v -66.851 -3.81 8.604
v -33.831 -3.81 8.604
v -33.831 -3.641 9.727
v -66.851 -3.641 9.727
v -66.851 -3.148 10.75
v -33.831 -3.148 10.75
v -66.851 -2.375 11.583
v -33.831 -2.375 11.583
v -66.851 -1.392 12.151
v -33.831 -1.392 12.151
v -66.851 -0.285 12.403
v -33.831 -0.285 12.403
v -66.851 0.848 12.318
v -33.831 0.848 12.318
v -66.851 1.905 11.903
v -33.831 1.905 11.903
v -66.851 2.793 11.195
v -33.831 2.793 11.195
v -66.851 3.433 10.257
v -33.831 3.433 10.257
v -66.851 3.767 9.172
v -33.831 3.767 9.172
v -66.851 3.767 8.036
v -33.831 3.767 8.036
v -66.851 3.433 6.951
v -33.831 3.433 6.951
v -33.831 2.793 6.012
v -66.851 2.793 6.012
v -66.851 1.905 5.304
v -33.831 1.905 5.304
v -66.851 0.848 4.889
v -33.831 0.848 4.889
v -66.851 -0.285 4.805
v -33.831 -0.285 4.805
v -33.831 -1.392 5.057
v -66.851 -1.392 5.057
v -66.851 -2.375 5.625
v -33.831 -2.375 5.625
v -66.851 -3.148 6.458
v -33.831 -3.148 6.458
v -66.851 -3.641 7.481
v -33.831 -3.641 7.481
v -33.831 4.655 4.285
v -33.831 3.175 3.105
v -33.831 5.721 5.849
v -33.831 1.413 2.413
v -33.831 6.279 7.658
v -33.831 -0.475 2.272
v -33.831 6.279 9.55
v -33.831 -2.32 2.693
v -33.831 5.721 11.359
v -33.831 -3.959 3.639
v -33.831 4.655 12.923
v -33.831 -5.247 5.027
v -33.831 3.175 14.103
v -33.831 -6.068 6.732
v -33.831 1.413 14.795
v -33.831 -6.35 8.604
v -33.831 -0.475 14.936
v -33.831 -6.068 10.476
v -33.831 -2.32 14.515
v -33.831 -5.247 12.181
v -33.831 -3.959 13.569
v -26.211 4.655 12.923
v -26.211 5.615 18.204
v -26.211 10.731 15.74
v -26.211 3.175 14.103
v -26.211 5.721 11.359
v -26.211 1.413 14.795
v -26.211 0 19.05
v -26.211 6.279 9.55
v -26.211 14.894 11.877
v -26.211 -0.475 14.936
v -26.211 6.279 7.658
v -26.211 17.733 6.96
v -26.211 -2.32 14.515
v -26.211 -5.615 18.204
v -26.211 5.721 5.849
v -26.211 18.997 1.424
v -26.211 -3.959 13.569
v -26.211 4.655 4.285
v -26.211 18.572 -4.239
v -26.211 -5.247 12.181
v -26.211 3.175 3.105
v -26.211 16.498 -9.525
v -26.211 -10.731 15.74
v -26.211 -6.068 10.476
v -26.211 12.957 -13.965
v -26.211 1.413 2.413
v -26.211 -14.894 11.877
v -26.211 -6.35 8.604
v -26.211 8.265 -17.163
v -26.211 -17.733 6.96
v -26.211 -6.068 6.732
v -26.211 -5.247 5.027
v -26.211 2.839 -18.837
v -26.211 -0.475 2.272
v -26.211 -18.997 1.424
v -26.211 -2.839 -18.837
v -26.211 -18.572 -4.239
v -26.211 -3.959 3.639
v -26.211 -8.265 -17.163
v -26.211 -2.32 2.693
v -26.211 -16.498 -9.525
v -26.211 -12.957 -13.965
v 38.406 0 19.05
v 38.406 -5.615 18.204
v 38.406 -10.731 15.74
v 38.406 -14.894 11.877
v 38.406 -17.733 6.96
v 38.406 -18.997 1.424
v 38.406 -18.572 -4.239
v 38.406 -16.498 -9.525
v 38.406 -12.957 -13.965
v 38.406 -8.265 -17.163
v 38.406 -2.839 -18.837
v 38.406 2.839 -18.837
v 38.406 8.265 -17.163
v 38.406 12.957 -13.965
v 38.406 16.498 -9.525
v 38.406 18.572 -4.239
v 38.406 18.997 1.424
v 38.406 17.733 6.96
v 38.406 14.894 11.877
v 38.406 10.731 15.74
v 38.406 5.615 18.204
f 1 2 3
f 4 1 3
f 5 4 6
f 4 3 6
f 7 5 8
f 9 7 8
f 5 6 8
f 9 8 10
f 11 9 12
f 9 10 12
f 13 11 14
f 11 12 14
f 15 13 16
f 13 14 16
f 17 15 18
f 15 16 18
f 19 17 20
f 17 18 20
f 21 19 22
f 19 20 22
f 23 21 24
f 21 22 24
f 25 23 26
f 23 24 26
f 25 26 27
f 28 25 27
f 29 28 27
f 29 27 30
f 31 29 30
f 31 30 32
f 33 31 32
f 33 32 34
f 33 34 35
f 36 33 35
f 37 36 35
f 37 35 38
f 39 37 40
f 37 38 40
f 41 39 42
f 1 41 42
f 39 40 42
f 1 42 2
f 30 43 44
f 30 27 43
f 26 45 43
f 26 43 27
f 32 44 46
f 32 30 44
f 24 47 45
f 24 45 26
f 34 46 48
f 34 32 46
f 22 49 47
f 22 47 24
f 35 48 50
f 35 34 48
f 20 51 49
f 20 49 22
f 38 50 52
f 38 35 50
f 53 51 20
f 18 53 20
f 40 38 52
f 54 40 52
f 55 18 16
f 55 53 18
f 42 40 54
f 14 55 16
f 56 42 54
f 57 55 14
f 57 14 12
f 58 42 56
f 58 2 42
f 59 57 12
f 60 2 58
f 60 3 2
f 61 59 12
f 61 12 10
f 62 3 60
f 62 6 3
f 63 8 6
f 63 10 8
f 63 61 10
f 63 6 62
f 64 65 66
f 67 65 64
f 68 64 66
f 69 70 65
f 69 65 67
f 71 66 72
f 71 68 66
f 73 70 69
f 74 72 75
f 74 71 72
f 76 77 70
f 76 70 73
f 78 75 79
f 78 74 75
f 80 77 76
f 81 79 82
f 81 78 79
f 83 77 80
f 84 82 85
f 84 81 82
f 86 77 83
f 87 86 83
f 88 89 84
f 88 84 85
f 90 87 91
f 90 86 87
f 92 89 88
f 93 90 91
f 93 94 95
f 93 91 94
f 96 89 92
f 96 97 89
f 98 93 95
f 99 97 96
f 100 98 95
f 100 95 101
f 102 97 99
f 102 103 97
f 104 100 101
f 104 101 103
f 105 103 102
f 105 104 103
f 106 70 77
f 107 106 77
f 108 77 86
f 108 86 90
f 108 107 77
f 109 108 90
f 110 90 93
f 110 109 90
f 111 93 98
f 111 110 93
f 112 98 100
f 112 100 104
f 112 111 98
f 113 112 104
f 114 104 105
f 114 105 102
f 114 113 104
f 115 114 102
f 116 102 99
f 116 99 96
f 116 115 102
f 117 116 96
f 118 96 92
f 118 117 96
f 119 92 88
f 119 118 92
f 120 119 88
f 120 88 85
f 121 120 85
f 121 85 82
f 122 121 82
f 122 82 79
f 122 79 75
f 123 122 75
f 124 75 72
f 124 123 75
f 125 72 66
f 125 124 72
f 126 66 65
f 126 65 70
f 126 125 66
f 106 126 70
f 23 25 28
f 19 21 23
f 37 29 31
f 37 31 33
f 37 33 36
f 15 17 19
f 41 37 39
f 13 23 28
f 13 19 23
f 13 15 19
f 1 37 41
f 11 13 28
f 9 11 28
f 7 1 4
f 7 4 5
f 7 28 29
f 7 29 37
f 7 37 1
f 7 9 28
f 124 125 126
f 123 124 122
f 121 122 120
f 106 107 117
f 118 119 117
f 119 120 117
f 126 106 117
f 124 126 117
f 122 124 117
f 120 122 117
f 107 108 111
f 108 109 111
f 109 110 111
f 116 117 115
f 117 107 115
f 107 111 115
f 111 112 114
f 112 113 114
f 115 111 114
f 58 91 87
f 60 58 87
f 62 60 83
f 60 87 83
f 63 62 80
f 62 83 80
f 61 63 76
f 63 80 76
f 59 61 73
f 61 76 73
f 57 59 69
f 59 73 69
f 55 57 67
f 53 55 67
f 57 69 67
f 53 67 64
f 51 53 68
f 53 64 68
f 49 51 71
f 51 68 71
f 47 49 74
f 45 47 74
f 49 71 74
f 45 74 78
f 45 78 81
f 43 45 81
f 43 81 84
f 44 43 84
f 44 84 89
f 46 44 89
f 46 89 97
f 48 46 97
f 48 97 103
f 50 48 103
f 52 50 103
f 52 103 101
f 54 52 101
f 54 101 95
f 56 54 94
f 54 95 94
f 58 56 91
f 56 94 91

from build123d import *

# Parameters (mm, degrees)
F0_W     = 64.6176
F0_H     = 19.05
F2_R     = 6.35
F3_DEPTH = 7.62
F4_R     = 3.81
F5_DEPTH = 33.02


with BuildPart() as f1:
    # F0 (on Front) → F1 (revolve)
    with BuildSketch(Plane.XZ):
        with Locations((6.097645, 9.525)):
            Rectangle(F0_W, F0_H)
    revolve(axis=Axis((6.097645, 0, 0), (1, 0, 0)))

    # F2 (on face) → F3 (join)
    with BuildSketch(Plane(origin=(-26.211155, 0, 0), x_dir=(0, -1, 0), z_dir=(-1, 0, 0))):
        with Locations((0, 8.60392)):
            Circle(F2_R)
    extrude(amount=F3_DEPTH)

    # F4 (on face) → F5 (join)
    with BuildSketch(Plane(origin=(-33.831155, 0, 0), x_dir=(0, -1, 0), z_dir=(-1, 0, 0))):
        with Locations((0, 8.60392)):
            Circle(F4_R)
    extrude(amount=F5_DEPTH)


solid = f1.part
